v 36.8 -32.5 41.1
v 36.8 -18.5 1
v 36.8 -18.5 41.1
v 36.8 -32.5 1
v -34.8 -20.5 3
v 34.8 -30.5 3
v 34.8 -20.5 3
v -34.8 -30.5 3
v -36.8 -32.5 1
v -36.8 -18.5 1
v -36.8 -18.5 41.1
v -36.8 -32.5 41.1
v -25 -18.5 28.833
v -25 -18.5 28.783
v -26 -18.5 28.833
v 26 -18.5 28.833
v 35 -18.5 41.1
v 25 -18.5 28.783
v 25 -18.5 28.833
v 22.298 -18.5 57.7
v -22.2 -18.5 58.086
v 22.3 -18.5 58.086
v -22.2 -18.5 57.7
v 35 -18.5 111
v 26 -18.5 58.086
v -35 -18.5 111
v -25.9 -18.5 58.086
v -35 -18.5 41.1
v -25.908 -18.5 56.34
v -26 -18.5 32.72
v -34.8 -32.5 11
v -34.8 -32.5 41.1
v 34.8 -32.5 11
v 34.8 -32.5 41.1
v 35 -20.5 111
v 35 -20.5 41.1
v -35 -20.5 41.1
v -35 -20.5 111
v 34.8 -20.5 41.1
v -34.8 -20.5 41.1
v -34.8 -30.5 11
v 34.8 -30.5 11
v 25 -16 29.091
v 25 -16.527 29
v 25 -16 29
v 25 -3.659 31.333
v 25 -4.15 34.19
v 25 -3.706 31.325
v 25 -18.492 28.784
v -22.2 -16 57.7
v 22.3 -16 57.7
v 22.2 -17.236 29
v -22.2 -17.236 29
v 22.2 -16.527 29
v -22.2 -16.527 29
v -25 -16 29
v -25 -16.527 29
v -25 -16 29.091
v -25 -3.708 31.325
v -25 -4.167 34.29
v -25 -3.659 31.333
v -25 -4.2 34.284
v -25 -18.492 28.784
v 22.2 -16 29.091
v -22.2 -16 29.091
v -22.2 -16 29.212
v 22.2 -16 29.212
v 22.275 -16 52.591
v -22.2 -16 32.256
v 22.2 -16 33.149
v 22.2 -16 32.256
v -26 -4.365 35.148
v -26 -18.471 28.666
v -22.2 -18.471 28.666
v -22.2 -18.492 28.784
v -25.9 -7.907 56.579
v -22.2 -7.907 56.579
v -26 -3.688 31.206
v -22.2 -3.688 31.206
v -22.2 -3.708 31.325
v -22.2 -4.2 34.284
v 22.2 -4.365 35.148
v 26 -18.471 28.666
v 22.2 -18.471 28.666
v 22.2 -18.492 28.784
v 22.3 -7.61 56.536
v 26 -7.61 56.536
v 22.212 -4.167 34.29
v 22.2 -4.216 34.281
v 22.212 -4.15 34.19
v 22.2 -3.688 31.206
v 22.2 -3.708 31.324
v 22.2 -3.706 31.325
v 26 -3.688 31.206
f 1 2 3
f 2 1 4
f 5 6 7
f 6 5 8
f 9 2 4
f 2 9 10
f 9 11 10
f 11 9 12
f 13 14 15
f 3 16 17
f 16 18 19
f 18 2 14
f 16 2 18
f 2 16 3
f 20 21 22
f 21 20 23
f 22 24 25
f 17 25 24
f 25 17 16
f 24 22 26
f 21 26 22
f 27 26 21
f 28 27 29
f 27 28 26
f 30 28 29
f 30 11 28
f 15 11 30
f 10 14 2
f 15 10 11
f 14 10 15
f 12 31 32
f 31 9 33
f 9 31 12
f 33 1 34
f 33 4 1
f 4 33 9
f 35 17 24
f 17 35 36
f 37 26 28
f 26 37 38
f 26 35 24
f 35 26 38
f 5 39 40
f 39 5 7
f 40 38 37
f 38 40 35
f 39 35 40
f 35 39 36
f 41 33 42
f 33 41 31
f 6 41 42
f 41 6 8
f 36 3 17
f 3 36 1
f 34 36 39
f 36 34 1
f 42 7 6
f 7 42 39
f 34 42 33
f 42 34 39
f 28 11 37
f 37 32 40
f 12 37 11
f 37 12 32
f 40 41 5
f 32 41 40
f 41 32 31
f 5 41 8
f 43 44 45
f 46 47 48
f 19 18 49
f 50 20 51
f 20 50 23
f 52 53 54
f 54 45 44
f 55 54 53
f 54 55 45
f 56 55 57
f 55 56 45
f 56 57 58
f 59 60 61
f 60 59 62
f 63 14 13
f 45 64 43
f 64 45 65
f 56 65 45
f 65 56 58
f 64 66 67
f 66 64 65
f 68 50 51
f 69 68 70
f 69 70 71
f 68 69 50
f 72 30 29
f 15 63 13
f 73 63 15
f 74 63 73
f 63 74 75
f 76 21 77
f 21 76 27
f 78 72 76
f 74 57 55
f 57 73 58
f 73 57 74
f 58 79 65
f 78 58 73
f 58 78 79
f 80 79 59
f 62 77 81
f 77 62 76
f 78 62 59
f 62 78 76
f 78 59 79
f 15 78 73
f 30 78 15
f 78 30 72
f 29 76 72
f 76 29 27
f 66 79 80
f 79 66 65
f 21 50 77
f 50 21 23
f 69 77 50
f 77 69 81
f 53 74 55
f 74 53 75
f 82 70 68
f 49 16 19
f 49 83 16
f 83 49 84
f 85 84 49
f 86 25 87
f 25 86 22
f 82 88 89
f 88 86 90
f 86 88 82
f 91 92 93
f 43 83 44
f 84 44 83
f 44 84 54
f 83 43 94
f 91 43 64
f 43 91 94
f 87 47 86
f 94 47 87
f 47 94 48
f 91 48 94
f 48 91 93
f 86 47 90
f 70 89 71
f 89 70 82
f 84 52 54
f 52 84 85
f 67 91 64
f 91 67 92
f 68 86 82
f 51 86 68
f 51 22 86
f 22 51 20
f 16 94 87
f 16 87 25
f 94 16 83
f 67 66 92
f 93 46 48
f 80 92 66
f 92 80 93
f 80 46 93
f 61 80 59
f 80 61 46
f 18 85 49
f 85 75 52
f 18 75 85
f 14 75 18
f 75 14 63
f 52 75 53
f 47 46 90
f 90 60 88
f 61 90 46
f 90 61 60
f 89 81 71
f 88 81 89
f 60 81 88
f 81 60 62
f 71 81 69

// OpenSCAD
//%import("C:/Users/UO251069/Desktop/PhoneHolder.stl");

module PhoneHolder(){

translate([-36.8,-32.5,1])
cube([73.6,14,2]);

rotate([0,90,0])
translate([-111,-20.5,-35])
cube([110,2,70]);

translate([-35,-32.5,3])
cube([70,2,8]);

rotate([0,0,90])
translate([-32.5,-36.8,2.5])
cube([14,2,38.6]);

rotate([0,0,90])
translate([-32.5,34.8,2.5])
cube([14,2,38.6]);

translate([-25,-20,29])
cube([50,4,28.7]);

hull(){
    rotate([0,8.1,90])
    translate([-27.8,22.2,50.8])
    cube([12,3.7,4.1]);

    rotate([0,-9.75,90])
    translate([-13.35,22.2,31.38])
    cube([15,3.8,4]);
}

hull(){
    rotate([0,8.1,90])
    translate([-27.8,-26,50.8])
    cube([12.3,3.7,4.1]);

    rotate([0,-9.75,90])
    translate([-13.35,-26,31.38])
    cube([15,3.8,4]);
}

rotate([9.75,0,0])
translate([-25,-14,31.5])
cube([50,15.7,3]);
}

PhoneHolder();
